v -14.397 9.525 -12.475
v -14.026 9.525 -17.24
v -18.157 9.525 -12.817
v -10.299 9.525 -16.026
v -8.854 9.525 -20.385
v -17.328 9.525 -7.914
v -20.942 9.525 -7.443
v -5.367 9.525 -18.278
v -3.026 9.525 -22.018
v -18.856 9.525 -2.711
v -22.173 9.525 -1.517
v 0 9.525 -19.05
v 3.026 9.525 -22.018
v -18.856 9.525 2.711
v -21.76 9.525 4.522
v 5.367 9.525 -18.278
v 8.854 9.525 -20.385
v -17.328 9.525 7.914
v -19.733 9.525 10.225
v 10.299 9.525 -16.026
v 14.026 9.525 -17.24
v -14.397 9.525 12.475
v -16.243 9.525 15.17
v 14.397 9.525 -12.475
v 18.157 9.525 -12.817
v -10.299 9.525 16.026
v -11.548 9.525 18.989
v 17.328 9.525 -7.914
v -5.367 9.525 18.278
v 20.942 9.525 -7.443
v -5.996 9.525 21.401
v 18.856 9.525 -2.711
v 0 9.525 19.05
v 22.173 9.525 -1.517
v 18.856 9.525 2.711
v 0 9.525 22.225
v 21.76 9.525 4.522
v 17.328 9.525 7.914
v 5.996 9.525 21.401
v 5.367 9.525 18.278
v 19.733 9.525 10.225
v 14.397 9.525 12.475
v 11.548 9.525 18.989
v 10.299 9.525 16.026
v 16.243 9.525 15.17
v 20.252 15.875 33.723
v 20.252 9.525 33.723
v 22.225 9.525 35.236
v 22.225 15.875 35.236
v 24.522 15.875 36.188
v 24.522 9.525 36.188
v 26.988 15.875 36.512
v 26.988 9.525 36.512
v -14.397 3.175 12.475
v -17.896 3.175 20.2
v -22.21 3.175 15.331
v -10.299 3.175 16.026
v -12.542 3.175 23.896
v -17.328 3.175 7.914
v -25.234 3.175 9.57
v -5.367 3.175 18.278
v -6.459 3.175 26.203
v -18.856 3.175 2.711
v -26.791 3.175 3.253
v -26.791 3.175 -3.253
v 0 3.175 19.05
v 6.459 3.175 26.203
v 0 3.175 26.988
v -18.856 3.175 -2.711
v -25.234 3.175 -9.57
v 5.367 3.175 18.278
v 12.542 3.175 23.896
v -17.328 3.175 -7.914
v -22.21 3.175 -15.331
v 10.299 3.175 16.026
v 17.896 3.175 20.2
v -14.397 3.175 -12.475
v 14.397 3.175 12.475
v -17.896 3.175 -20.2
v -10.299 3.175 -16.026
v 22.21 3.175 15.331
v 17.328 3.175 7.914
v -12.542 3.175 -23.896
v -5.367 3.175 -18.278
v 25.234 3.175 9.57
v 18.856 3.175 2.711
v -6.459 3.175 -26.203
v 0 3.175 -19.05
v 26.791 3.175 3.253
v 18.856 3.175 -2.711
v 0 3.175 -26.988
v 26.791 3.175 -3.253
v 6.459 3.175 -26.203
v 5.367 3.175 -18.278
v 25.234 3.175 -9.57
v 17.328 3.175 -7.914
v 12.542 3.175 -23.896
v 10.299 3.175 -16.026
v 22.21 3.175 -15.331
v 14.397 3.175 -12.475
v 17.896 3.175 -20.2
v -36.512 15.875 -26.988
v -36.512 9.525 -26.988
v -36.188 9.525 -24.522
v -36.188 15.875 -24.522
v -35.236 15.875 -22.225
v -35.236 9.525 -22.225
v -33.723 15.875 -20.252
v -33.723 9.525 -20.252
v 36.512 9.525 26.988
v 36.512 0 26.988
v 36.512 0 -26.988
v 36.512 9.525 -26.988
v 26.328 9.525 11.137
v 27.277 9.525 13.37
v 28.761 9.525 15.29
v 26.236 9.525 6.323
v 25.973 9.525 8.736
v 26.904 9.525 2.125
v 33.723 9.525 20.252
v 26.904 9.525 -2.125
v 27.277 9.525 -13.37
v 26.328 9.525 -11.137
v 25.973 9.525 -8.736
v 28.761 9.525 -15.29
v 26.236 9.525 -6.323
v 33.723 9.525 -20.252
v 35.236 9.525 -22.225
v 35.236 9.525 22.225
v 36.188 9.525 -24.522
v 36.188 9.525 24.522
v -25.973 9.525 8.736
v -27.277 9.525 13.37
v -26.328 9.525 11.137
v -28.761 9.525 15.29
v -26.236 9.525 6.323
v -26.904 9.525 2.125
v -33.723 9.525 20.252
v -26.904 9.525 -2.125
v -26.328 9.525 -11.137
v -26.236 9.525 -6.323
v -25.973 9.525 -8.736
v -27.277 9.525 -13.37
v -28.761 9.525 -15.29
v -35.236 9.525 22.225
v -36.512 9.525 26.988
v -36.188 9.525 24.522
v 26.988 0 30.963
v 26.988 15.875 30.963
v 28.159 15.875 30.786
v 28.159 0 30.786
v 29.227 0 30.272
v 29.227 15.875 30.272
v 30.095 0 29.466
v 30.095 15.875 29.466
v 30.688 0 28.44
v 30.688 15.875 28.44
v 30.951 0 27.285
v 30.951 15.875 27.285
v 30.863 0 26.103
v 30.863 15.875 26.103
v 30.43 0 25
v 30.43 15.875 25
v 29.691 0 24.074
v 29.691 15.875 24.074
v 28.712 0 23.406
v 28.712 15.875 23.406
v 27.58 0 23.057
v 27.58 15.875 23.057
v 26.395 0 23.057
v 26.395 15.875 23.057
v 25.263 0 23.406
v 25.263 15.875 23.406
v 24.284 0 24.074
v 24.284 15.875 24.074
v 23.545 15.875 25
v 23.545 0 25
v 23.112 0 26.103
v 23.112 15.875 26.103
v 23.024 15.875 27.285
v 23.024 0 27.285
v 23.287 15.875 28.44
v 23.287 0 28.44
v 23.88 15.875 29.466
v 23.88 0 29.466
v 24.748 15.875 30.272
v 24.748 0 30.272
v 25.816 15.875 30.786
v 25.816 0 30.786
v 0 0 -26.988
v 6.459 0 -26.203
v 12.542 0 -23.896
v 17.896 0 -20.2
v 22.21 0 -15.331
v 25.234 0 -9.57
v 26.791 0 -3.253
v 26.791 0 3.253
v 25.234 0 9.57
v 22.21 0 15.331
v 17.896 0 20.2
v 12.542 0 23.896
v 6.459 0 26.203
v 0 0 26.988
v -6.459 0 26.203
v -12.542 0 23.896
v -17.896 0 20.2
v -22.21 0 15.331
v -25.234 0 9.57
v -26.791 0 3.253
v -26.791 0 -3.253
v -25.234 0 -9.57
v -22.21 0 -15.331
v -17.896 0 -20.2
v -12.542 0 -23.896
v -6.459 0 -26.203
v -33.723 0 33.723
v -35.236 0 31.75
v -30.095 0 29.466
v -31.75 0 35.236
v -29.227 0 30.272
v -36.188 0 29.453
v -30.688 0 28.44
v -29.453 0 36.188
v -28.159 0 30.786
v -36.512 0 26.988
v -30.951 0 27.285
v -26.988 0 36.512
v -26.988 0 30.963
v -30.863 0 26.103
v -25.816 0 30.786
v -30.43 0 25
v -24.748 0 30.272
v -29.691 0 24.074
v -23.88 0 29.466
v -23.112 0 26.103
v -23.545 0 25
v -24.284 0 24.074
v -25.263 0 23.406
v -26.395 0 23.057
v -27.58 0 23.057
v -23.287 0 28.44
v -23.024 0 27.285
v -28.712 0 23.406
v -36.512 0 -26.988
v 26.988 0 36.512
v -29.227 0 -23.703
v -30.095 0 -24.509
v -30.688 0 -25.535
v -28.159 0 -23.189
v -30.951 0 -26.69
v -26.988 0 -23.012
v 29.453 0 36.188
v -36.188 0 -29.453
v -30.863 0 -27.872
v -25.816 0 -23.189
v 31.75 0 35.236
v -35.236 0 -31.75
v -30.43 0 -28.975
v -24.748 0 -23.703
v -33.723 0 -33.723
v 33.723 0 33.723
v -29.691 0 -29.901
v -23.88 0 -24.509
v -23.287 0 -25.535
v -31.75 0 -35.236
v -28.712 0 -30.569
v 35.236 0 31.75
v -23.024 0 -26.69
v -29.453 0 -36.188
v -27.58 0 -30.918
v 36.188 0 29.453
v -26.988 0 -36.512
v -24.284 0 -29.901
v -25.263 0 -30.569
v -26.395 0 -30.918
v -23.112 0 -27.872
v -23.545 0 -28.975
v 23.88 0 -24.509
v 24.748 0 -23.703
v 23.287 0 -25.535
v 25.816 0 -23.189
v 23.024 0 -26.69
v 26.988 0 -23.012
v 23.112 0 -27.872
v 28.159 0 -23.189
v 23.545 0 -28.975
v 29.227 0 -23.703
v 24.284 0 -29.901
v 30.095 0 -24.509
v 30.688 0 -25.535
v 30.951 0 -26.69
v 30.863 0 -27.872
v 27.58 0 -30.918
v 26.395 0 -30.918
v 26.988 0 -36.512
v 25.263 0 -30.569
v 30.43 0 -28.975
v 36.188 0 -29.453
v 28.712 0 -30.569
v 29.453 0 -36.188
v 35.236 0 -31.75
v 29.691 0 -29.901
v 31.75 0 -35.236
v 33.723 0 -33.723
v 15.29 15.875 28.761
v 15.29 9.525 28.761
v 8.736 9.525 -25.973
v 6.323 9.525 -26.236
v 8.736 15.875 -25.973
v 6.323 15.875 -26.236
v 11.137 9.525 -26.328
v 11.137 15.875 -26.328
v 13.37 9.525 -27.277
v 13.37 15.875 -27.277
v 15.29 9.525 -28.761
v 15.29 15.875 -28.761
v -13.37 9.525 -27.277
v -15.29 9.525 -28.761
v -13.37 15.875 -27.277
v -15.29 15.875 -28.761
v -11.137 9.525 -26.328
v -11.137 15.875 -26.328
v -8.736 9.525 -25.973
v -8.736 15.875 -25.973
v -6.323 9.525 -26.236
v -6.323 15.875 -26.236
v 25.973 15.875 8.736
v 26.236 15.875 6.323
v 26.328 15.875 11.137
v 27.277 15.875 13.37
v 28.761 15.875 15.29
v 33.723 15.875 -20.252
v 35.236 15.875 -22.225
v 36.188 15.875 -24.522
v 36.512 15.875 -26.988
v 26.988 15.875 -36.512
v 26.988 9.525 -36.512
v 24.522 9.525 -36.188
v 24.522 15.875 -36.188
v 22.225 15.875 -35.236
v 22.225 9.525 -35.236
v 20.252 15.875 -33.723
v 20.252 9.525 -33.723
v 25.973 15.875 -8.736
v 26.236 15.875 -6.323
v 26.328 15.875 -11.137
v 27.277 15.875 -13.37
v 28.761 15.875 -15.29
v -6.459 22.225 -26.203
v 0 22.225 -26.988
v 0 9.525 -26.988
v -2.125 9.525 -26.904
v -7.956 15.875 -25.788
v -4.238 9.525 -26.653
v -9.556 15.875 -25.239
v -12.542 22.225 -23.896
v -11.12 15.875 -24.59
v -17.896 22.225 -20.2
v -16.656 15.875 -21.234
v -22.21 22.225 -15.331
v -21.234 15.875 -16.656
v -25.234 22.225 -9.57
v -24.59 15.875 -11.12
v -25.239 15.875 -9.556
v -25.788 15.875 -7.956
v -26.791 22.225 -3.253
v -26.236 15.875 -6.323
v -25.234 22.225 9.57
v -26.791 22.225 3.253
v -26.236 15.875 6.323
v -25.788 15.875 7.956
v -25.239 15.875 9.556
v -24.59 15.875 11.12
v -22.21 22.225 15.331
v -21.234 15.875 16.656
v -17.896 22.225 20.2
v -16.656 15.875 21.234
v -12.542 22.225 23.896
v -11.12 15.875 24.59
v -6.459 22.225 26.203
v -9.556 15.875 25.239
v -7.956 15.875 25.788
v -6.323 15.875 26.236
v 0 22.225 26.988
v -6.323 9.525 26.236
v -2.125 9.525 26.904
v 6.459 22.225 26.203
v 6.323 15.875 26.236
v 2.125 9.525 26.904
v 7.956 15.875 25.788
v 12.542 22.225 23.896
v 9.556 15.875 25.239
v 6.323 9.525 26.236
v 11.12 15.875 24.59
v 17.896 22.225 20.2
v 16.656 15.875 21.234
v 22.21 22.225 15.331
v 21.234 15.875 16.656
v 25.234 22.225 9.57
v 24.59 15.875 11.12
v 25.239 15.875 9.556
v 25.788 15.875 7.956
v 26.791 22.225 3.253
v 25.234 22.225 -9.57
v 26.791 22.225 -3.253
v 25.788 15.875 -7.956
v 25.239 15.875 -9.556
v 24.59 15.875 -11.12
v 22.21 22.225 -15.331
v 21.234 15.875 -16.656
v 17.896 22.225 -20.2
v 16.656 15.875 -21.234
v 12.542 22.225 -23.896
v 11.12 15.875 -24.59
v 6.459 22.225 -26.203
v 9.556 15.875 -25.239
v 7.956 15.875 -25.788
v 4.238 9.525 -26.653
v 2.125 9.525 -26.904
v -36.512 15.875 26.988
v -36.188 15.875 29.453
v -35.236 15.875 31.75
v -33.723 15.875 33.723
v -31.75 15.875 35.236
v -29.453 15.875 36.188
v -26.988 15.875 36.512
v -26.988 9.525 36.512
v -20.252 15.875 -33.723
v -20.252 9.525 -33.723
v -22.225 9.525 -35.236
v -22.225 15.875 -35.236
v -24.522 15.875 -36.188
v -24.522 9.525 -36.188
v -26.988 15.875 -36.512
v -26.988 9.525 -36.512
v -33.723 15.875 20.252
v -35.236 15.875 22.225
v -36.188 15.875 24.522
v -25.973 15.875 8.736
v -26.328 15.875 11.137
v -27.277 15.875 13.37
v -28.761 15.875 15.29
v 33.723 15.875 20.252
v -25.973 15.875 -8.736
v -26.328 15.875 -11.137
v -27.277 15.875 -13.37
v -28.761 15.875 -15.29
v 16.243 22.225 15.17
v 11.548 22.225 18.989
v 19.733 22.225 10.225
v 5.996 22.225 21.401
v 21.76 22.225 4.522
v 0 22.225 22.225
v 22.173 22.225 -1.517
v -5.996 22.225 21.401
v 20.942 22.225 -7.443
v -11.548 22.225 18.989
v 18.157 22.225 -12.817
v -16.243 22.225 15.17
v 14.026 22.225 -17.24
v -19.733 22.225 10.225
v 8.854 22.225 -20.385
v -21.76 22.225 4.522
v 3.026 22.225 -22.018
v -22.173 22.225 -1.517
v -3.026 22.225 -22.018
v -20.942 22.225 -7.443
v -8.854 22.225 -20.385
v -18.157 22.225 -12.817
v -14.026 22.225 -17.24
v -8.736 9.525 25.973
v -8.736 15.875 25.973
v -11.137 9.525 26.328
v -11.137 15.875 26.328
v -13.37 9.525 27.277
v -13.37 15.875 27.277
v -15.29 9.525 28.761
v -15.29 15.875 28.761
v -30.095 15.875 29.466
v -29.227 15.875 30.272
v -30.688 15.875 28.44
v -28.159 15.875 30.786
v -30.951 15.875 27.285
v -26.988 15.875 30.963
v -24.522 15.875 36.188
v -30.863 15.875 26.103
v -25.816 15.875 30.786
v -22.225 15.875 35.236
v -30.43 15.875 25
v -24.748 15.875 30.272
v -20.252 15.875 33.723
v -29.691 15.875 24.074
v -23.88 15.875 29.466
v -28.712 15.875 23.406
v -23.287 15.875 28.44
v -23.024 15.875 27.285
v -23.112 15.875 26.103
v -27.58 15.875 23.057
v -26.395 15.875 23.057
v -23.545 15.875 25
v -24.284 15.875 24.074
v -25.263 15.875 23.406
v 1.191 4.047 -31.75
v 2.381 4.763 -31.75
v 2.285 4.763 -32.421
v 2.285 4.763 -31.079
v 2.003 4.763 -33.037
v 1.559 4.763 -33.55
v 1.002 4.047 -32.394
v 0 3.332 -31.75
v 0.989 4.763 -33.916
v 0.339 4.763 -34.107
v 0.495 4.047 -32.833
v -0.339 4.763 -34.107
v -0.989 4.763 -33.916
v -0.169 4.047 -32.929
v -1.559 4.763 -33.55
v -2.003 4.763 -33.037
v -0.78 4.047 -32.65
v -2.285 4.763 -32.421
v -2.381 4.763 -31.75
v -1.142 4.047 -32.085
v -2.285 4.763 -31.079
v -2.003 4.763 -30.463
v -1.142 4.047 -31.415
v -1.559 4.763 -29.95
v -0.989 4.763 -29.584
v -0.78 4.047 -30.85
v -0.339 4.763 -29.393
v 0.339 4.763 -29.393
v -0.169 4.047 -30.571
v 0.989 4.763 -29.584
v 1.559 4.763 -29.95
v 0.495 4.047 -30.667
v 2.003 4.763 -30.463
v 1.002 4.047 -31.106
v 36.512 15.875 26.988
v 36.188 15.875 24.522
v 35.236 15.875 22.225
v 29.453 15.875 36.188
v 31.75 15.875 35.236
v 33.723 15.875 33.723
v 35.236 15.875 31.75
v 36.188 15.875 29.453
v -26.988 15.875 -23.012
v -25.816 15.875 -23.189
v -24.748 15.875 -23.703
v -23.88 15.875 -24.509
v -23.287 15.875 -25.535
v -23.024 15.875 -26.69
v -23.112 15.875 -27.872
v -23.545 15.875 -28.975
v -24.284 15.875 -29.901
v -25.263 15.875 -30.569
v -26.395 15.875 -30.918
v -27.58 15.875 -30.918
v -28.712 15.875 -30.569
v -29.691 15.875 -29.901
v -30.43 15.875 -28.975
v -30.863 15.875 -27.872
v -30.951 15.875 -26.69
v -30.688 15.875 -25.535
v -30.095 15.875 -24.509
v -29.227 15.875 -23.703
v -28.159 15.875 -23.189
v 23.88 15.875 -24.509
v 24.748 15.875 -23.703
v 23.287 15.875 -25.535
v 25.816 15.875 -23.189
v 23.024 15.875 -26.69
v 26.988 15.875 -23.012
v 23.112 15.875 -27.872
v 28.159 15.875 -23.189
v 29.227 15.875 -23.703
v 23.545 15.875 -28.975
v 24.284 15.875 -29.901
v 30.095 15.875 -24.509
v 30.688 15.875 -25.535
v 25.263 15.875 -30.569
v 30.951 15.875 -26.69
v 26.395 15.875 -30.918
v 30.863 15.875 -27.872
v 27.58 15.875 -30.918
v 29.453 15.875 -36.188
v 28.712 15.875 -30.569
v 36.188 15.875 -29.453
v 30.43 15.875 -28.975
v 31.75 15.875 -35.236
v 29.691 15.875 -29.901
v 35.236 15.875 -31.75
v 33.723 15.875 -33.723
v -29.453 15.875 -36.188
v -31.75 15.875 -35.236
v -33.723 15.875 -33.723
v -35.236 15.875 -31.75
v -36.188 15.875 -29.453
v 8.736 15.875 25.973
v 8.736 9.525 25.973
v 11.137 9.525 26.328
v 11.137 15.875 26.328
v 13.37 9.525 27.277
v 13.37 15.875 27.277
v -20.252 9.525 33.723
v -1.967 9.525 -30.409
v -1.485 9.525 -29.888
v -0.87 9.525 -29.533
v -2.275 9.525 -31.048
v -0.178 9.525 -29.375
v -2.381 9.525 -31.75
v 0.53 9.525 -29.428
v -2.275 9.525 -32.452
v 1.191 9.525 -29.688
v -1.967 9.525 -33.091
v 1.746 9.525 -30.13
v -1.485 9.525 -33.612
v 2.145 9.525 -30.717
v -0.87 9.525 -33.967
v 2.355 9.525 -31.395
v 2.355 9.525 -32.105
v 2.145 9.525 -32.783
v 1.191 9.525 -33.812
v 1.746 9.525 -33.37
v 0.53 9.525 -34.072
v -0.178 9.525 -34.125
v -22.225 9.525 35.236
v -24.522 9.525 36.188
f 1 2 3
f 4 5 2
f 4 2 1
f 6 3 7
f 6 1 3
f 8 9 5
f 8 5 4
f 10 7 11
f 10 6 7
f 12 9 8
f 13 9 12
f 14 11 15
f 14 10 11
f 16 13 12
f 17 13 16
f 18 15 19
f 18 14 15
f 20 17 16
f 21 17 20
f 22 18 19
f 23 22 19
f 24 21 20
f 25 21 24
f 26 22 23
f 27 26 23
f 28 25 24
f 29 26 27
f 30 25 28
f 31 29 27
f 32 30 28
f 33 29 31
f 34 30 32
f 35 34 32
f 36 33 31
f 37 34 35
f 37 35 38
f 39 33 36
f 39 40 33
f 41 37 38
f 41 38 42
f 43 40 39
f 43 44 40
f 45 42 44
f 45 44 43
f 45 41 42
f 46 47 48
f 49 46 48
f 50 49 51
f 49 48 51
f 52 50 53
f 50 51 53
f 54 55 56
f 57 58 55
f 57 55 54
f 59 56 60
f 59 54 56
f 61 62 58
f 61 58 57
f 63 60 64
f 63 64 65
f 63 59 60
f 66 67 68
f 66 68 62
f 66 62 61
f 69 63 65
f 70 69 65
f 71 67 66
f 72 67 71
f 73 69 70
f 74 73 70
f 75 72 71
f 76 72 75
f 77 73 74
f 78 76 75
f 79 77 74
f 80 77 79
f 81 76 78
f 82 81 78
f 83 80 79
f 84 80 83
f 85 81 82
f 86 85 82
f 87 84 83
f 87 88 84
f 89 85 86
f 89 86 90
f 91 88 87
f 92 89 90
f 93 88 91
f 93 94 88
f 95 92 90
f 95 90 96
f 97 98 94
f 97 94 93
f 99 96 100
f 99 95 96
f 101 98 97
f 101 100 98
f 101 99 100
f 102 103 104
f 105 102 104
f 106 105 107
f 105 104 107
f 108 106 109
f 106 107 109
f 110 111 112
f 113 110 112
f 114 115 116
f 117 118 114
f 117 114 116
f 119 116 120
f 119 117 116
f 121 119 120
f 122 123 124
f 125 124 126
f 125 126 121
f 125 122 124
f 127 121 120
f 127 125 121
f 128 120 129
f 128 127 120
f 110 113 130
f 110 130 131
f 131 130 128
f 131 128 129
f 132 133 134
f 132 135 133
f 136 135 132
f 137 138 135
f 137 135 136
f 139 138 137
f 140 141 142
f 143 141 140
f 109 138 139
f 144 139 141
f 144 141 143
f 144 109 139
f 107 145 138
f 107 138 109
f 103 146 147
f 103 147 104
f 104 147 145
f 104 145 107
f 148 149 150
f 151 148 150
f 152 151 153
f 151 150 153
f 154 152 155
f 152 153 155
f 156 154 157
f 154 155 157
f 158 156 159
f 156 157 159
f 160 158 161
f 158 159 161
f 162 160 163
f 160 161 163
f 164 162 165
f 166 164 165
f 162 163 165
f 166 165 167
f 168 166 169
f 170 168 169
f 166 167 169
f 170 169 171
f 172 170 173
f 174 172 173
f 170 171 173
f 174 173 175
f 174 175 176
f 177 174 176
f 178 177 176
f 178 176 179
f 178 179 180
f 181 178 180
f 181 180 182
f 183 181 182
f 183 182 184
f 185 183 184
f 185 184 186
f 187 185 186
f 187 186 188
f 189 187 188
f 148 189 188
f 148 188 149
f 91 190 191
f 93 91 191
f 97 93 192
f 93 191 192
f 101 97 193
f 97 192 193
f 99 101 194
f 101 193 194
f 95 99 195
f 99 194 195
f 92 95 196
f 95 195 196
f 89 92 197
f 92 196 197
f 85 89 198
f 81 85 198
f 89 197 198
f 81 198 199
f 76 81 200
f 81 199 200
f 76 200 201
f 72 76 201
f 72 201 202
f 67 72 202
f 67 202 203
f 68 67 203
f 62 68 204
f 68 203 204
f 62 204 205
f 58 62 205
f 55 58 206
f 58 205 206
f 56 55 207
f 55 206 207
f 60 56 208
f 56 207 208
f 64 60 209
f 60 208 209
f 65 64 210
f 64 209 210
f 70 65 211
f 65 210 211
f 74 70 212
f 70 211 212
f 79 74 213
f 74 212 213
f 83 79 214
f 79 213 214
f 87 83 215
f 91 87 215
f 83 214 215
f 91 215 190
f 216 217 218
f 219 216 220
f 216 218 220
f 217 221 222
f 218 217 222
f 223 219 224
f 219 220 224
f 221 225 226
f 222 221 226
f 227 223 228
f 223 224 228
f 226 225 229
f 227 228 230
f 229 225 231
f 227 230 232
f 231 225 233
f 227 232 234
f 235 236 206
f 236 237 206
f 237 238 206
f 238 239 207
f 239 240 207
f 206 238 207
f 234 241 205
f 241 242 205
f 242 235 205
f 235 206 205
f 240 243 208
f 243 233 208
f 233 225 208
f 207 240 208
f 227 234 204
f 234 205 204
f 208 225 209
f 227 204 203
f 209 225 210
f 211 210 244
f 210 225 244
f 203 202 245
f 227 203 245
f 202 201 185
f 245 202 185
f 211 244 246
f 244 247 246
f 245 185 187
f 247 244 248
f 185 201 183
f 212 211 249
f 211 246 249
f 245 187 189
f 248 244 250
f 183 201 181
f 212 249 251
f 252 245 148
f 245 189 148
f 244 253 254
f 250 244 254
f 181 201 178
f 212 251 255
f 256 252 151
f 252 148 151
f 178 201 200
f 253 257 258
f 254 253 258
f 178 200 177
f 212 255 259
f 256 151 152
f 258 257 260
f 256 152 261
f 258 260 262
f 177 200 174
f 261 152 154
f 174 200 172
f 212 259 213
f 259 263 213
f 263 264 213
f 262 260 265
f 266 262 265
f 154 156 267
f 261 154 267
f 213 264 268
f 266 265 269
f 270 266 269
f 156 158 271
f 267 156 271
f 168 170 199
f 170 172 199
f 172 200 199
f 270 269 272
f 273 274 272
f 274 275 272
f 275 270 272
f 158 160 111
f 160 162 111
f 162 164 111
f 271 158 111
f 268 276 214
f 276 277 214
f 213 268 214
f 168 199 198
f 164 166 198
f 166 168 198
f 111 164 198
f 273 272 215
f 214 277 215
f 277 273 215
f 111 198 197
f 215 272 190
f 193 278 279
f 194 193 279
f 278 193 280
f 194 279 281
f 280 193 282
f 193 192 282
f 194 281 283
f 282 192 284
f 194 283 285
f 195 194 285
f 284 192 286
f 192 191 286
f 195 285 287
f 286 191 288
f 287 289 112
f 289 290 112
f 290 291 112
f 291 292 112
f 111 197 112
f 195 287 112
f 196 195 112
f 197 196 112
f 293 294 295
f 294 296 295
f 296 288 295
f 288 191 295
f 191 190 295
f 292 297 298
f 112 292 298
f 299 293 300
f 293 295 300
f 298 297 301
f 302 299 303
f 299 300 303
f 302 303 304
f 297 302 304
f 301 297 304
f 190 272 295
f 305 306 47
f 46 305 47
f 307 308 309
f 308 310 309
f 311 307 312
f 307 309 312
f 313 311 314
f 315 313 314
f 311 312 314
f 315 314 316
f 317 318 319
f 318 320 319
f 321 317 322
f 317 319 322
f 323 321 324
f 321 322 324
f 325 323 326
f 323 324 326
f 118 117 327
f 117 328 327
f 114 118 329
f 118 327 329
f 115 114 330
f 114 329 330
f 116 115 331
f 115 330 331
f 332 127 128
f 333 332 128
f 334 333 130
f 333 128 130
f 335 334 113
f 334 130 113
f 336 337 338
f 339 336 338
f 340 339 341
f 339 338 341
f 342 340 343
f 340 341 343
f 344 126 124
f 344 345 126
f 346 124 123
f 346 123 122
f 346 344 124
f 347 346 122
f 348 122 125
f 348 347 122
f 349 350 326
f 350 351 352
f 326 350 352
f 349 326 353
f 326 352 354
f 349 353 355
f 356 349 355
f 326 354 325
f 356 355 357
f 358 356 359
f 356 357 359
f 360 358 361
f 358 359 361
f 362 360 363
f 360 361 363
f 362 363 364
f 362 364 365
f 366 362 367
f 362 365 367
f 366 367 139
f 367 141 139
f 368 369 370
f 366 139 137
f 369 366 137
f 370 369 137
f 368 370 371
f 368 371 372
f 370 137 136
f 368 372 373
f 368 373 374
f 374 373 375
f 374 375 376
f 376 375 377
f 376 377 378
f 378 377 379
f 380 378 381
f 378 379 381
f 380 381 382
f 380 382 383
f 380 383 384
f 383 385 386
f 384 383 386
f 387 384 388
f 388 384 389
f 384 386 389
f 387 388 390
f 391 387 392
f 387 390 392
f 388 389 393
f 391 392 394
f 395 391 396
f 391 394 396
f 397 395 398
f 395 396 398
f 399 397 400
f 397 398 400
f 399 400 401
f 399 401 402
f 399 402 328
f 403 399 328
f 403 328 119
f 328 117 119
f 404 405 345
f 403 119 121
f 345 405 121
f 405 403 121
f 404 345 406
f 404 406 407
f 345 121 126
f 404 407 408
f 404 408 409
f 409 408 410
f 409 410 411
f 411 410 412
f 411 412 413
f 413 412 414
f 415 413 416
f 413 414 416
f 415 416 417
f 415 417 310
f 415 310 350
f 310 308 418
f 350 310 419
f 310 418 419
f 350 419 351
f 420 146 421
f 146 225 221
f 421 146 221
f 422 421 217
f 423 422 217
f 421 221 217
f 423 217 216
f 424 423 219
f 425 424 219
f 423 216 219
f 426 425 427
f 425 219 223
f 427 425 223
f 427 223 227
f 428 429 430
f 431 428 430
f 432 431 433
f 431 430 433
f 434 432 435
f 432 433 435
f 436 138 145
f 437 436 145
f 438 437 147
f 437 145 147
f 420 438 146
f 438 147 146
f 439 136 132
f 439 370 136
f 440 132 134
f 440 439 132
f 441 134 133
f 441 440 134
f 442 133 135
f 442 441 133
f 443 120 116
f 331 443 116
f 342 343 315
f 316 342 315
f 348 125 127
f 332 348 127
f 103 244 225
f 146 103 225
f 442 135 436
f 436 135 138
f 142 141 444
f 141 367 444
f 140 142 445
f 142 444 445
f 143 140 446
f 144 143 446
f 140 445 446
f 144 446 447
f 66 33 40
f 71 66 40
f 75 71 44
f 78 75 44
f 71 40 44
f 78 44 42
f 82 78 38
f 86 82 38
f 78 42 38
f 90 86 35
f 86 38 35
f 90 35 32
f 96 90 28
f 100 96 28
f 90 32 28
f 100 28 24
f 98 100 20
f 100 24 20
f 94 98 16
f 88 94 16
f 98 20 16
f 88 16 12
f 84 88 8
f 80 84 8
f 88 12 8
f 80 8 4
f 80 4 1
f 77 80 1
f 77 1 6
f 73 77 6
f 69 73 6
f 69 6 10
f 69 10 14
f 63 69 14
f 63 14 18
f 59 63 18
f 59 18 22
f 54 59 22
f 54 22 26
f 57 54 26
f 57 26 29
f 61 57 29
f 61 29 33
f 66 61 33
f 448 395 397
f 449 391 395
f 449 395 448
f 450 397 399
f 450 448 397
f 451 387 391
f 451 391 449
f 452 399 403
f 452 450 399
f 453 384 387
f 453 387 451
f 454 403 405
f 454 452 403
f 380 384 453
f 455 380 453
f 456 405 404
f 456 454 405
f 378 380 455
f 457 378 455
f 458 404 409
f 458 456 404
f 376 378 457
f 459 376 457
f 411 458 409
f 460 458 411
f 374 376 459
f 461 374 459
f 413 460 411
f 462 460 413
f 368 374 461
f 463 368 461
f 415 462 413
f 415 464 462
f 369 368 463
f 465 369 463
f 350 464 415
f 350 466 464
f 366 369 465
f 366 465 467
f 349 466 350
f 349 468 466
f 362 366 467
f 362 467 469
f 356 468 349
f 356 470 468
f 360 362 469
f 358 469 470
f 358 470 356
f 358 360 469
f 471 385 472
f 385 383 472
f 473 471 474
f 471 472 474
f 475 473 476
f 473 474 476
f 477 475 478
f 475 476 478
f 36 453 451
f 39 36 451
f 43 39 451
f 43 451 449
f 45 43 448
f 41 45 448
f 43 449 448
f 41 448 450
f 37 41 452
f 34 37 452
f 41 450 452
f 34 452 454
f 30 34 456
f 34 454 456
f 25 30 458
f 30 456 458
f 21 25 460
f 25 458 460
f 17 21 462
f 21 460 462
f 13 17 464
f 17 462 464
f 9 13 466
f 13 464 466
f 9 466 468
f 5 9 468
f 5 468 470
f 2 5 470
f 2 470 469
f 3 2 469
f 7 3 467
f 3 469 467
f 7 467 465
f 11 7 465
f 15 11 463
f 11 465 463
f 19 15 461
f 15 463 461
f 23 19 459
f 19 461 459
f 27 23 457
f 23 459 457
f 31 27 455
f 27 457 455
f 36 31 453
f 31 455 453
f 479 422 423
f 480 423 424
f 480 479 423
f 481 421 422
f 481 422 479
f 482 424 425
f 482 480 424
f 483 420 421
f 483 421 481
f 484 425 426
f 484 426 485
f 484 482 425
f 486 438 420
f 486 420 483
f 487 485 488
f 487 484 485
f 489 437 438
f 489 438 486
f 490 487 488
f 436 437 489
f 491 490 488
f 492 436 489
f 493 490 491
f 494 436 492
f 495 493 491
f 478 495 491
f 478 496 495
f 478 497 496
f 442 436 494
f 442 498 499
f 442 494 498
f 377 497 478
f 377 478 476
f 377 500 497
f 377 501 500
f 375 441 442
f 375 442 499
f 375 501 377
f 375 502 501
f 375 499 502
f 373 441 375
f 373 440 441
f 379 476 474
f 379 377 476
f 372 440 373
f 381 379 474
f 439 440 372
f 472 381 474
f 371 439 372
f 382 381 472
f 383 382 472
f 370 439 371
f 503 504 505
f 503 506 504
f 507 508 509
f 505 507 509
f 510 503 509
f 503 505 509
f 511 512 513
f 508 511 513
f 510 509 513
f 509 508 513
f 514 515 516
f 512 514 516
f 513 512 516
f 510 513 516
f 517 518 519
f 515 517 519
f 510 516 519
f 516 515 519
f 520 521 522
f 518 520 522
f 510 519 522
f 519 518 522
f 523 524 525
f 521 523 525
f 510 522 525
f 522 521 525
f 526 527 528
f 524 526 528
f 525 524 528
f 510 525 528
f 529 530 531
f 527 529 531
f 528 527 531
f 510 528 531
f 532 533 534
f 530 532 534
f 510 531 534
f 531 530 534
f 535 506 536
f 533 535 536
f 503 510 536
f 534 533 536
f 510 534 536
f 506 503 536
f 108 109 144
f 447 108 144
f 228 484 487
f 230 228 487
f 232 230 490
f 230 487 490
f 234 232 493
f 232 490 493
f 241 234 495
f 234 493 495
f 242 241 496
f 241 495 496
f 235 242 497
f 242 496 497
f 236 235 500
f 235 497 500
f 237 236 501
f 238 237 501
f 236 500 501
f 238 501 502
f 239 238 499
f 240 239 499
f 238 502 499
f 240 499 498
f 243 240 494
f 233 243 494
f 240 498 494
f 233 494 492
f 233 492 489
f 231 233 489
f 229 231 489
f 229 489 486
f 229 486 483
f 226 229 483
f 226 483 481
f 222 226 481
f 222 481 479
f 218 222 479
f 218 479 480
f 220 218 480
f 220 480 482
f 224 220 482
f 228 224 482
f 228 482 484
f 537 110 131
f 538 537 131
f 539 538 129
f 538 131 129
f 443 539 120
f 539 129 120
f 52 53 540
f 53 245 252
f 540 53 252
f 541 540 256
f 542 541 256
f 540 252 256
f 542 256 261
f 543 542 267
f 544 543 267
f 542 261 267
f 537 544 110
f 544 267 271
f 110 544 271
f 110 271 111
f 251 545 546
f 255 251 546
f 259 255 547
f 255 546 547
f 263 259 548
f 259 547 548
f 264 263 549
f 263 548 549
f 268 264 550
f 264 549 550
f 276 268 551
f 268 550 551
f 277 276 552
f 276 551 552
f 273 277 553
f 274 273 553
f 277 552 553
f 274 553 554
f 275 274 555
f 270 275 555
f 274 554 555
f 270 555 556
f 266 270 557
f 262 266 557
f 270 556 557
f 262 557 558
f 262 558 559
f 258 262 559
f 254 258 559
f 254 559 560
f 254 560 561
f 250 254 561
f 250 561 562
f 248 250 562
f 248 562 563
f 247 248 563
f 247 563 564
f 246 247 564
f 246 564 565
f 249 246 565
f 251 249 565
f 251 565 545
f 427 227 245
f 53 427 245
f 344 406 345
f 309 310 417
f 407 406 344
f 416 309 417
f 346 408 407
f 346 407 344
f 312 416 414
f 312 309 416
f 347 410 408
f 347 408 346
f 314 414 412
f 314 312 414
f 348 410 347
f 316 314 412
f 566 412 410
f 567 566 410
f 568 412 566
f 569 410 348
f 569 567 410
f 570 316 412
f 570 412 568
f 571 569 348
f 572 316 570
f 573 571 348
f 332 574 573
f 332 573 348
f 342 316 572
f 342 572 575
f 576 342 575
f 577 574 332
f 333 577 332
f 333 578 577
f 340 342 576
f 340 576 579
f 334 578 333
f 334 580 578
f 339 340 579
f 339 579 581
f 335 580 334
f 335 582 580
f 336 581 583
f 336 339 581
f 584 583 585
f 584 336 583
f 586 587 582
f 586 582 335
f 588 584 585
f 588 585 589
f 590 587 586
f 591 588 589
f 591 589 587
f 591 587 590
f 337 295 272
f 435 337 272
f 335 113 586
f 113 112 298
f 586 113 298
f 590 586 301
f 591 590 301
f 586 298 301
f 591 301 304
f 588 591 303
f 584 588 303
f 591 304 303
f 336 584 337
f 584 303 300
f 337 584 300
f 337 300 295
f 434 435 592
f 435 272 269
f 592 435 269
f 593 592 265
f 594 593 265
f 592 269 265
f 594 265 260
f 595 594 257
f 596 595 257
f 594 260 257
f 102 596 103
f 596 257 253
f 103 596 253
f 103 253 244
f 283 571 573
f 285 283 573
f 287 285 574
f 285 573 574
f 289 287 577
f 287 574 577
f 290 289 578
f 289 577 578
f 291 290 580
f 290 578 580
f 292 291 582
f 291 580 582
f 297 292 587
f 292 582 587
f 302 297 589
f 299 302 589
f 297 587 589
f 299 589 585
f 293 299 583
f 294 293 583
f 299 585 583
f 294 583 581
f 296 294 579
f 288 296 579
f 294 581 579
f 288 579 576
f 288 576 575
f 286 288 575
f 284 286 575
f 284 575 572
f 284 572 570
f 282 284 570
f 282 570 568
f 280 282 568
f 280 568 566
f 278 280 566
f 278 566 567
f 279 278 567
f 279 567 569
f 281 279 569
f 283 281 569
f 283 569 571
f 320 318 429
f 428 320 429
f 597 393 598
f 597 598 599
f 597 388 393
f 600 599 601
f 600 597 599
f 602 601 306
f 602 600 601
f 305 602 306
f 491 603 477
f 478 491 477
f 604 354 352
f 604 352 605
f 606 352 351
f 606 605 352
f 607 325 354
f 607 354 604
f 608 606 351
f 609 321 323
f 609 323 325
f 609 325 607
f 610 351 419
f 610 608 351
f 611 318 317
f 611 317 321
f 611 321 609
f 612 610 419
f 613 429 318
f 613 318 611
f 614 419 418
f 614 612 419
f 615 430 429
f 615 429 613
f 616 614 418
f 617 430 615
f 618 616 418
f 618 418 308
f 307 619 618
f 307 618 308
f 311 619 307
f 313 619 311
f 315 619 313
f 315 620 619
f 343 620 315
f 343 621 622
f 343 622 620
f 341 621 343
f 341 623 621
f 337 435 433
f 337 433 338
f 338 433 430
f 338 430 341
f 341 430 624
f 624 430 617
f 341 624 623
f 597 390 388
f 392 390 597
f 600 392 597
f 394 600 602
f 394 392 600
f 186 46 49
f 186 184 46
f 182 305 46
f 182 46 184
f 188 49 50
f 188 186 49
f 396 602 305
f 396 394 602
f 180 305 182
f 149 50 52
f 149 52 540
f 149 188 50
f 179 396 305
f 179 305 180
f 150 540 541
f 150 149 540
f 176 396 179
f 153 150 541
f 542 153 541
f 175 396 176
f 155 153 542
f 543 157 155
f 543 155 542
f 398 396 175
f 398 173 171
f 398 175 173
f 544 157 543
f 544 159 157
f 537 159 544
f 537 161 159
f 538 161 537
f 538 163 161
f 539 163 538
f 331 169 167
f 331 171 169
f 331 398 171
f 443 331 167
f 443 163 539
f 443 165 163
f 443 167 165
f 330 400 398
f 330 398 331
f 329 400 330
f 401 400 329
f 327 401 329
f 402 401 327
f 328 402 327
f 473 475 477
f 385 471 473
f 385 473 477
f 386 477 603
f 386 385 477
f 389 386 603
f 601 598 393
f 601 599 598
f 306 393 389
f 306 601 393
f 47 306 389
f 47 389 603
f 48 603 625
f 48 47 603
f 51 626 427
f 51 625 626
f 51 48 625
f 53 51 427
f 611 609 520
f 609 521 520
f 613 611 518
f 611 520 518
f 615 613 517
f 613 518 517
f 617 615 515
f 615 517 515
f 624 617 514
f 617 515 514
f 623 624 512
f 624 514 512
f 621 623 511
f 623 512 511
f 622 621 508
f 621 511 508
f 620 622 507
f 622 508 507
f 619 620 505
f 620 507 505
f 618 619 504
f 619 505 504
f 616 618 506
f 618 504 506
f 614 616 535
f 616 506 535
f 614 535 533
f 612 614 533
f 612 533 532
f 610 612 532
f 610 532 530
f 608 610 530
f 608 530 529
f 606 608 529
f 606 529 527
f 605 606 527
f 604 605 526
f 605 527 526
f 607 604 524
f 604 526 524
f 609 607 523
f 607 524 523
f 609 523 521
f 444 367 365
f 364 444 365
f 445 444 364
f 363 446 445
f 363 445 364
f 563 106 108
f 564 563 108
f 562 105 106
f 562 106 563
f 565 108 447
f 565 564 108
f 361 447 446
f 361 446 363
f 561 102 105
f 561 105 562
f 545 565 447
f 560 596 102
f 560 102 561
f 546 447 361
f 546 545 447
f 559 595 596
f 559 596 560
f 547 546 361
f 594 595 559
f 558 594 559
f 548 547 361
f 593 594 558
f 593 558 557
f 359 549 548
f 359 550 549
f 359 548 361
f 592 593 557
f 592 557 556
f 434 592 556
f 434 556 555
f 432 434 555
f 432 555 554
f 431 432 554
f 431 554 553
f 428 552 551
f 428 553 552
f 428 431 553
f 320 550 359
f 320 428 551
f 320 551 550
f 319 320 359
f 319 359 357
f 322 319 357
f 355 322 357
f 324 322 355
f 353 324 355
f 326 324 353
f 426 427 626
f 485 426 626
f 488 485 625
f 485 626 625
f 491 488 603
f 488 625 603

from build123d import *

# Parameters (mm, degrees)
BOSS_EXTRUDE1_DEPTH                = 9.525
SKETCH2_R                          = 26.9875
CUT_EXTRUDE1_DEPTH                 = 3.175
SKETCH3_R                          = 26.9875
BOSS_EXTRUDE2_DEPTH                = 12.7
SKETCH4_R                          = 22.225
CUT_EXTRUDE2_DEPTH                 = 12.7
SKETCH5_R                          = 19.05
CUT_EXTRUDE3_DEPTH                 = 54.175326163
F_3_16_0_1875_DIAMETER_HOLE1_D     = 4.7625
F_3_16_0_1875_DIAMETER_HOLE1_DEPTH = 4.7625
F_3_16_0_1875_DIAMETER_HOLE1_TIP   = 1.430799349
BOSS_EXTRUDE3_DEPTH                = 6.35
FILLET1_R                          = 9.525
SKETCH10_R                         = 3.9751
CUT_EXTRUDE4_DEPTH                 = 55.021670999


with BuildPart() as part:
    # Sketch1 → Boss-Extrude1 (new body)
    with BuildSketch(Plane(origin=(0, 0, 0), x_dir=(1, 0, 0), z_dir=(0, 1, 0))):
        with BuildLine():
            Line((-26.9875, -36.5125), (26.9875, -36.5125))
            ThreePointArc((26.9875, -36.5125), (33.722692091, -33.722692091), (36.5125, -26.9875))
            Line((36.5125, -26.9875), (36.5125, 26.9875))
            ThreePointArc((36.5125, 26.9875), (33.722692091, 33.722692091), (26.9875, 36.5125))
            Line((26.9875, 36.5125), (-26.9875, 36.5125))
            ThreePointArc((-26.9875, 36.5125), (-33.722692091, 33.722692091), (-36.5125, 26.9875))
            Line((-36.5125, 26.9875), (-36.5125, -26.9875))
            ThreePointArc((-36.5125, -26.9875), (-33.722692091, -33.722692091), (-26.9875, -36.5125))
        make_face()
    extrude(amount=BOSS_EXTRUDE1_DEPTH)

    # Sketch2 → Cut-Extrude1 (cut)
    with BuildSketch(Plane.XZ):
        with Locations(Location((0, 0, 0), (0, 0, 270))):
            Circle(SKETCH2_R)
    extrude(amount=-CUT_EXTRUDE1_DEPTH, mode=Mode.SUBTRACT)

    # Sketch3 → Boss-Extrude2 (add)
    with BuildSketch(Plane(origin=(0, 9.525, 0), x_dir=(1, 0, 0), z_dir=(0, 1, 0))):
        with Locations(Location((0, 0, 0), (0, 0, 90))):
            Circle(SKETCH3_R)
    extrude(amount=BOSS_EXTRUDE2_DEPTH)

    # Sketch4 → Cut-Extrude2 (cut)
    with BuildSketch(Plane(origin=(0, 22.225, 0), x_dir=(1, 0, 0), z_dir=(0, 1, 0))):
        with Locations(Location((0, 0, 0), (0, 0, 270))):
            Circle(SKETCH4_R)
    extrude(amount=-CUT_EXTRUDE2_DEPTH, mode=Mode.SUBTRACT)

    # Sketch5 → Cut-Extrude3 (cut, through all)
    with BuildSketch(Plane(origin=(0, 9.525, 0), x_dir=(1, 0, 0), z_dir=(0, 1, 0))):
        with Locations(Location((0, 0, 0), (0, 0, 270))):
            Circle(SKETCH5_R)
    extrude(amount=-CUT_EXTRUDE3_DEPTH, mode=Mode.SUBTRACT)

    # 3/16 (0.1875) Diameter Hole1
    with Locations(Plane(origin=(0, 9.525, 0), x_dir=(1, 0, 0), z_dir=(0, 1, 0))):
        with Locations((0, 31.75)):
            Hole(F_3_16_0_1875_DIAMETER_HOLE1_D / 2, depth=F_3_16_0_1875_DIAMETER_HOLE1_DEPTH)
            with Locations((0, 0, -(F_3_16_0_1875_DIAMETER_HOLE1_DEPTH + F_3_16_0_1875_DIAMETER_HOLE1_TIP / 2))):  # 118° drill point
                Cone(0, F_3_16_0_1875_DIAMETER_HOLE1_D / 2, F_3_16_0_1875_DIAMETER_HOLE1_TIP, mode=Mode.SUBTRACT)

    # Sketch9 → Boss-Extrude3 (add)
    with BuildSketch(Plane(origin=(0, 9.525, 0), x_dir=(1, 0, 0), z_dir=(0, 1, 0))):
        with BuildLine():
            ThreePointArc((-24.590156824, 11.119772642), (-19.083044257, 19.083044257), (-11.119772642, 24.590156824))
            Line((-11.119772642, 24.590156824), (-20.252307909, 33.722692091))
            ThreePointArc((-20.252307909, 33.722692091), (-23.342440307, 35.787452547), (-26.9875, 36.5125))
            ThreePointArc((-26.9875, 36.5125), (-33.722692091, 33.722692091), (-36.5125, 26.9875))
            ThreePointArc((-36.5125, 26.9875), (-35.787452547, 23.342440307), (-33.722692091, 20.252307909))
            Line((-33.722692091, 20.252307909), (-24.590156824, 11.119772642))
        make_face()
        with BuildLine():
            ThreePointArc((11.119772642, 24.590156824), (19.083044257, 19.083044257), (24.590156824, 11.119772642))
            Line((24.590156824, 11.119772642), (33.722692091, 20.252307909))
            ThreePointArc((33.722692091, 20.252307909), (35.787452547, 23.342440307), (36.5125, 26.9875))
            ThreePointArc((36.5125, 26.9875), (33.722692091, 33.722692091), (26.9875, 36.5125))
            ThreePointArc((26.9875, 36.5125), (23.342440307, 35.787452547), (20.252307909, 33.722692091))
            Line((20.252307909, 33.722692091), (11.119772642, 24.590156824))
        make_face()
        with BuildLine():
            Line((33.722692091, -20.252307909), (24.590156824, -11.119772642))
            ThreePointArc((24.590156824, -11.119772642), (19.083044257, -19.083044257), (11.119772642, -24.590156824))
            Line((11.119772642, -24.590156824), (20.252307909, -33.722692091))
            ThreePointArc((20.252307909, -33.722692091), (23.342440307, -35.787452547), (26.9875, -36.5125))
            ThreePointArc((26.9875, -36.5125), (33.722692091, -33.722692091), (36.5125, -26.9875))
            ThreePointArc((36.5125, -26.9875), (35.787452547, -23.342440307), (33.722692091, -20.252307909))
        make_face()
        with BuildLine():
            Line((-20.252307909, -33.722692091), (-11.119772642, -24.590156824))
            ThreePointArc((-11.119772642, -24.590156824), (-19.083044257, -19.083044257), (-24.590156824, -11.119772642))
            Line((-24.590156824, -11.119772642), (-33.722692091, -20.252307909))
            ThreePointArc((-33.722692091, -20.252307909), (-35.787452547, -23.342440307), (-36.5125, -26.9875))
            ThreePointArc((-36.5125, -26.9875), (-33.722692091, -33.722692091), (-26.9875, -36.5125))
            ThreePointArc((-26.9875, -36.5125), (-23.342440307, -35.787452547), (-20.252307909, -33.722692091))
        make_face()
    extrude(amount=BOSS_EXTRUDE3_DEPTH)

    # Fillet1
    fillet1_edges = [part.edges().sort_by_distance(p)[0] for p in [
        (24.590156824, 12.7, 11.119772642),
        (11.119772642, 12.7, 24.590156824),
        (-11.119772642, 12.7, 24.590156824),
        (-24.590156824, 12.7, 11.119772642),
        (-11.119772642, 12.7, -24.590156824),
        (-24.590156824, 12.7, -11.119772642),
        (24.590156824, 12.7, -11.119772642),
        (11.119772642, 12.7, -24.590156824),
    ]]
    fillet(fillet1_edges, radius=FILLET1_R)

    # Sketch10 → Cut-Extrude4 (cut, through all)
    with BuildSketch(Plane(origin=(0, 15.875, 0), x_dir=(1, 0, 0), z_dir=(0, 1, 0))):
        with Locations(Location((-26.9875, 26.9875, 0), (0, 0, 270))):
            Circle(SKETCH10_R)
        with Locations(Location((26.9875, 26.9875, 0), (0, 0, 270))):
            Circle(SKETCH10_R)
        with Locations(Location((26.9875, -26.9875, 0), (0, 0, 270))):
            Circle(SKETCH10_R)
        with Locations(Location((-26.9875, -26.9875, 0), (0, 0, 270))):
            Circle(SKETCH10_R)
    extrude(amount=-CUT_EXTRUDE4_DEPTH, mode=Mode.SUBTRACT)


solid = part.part
